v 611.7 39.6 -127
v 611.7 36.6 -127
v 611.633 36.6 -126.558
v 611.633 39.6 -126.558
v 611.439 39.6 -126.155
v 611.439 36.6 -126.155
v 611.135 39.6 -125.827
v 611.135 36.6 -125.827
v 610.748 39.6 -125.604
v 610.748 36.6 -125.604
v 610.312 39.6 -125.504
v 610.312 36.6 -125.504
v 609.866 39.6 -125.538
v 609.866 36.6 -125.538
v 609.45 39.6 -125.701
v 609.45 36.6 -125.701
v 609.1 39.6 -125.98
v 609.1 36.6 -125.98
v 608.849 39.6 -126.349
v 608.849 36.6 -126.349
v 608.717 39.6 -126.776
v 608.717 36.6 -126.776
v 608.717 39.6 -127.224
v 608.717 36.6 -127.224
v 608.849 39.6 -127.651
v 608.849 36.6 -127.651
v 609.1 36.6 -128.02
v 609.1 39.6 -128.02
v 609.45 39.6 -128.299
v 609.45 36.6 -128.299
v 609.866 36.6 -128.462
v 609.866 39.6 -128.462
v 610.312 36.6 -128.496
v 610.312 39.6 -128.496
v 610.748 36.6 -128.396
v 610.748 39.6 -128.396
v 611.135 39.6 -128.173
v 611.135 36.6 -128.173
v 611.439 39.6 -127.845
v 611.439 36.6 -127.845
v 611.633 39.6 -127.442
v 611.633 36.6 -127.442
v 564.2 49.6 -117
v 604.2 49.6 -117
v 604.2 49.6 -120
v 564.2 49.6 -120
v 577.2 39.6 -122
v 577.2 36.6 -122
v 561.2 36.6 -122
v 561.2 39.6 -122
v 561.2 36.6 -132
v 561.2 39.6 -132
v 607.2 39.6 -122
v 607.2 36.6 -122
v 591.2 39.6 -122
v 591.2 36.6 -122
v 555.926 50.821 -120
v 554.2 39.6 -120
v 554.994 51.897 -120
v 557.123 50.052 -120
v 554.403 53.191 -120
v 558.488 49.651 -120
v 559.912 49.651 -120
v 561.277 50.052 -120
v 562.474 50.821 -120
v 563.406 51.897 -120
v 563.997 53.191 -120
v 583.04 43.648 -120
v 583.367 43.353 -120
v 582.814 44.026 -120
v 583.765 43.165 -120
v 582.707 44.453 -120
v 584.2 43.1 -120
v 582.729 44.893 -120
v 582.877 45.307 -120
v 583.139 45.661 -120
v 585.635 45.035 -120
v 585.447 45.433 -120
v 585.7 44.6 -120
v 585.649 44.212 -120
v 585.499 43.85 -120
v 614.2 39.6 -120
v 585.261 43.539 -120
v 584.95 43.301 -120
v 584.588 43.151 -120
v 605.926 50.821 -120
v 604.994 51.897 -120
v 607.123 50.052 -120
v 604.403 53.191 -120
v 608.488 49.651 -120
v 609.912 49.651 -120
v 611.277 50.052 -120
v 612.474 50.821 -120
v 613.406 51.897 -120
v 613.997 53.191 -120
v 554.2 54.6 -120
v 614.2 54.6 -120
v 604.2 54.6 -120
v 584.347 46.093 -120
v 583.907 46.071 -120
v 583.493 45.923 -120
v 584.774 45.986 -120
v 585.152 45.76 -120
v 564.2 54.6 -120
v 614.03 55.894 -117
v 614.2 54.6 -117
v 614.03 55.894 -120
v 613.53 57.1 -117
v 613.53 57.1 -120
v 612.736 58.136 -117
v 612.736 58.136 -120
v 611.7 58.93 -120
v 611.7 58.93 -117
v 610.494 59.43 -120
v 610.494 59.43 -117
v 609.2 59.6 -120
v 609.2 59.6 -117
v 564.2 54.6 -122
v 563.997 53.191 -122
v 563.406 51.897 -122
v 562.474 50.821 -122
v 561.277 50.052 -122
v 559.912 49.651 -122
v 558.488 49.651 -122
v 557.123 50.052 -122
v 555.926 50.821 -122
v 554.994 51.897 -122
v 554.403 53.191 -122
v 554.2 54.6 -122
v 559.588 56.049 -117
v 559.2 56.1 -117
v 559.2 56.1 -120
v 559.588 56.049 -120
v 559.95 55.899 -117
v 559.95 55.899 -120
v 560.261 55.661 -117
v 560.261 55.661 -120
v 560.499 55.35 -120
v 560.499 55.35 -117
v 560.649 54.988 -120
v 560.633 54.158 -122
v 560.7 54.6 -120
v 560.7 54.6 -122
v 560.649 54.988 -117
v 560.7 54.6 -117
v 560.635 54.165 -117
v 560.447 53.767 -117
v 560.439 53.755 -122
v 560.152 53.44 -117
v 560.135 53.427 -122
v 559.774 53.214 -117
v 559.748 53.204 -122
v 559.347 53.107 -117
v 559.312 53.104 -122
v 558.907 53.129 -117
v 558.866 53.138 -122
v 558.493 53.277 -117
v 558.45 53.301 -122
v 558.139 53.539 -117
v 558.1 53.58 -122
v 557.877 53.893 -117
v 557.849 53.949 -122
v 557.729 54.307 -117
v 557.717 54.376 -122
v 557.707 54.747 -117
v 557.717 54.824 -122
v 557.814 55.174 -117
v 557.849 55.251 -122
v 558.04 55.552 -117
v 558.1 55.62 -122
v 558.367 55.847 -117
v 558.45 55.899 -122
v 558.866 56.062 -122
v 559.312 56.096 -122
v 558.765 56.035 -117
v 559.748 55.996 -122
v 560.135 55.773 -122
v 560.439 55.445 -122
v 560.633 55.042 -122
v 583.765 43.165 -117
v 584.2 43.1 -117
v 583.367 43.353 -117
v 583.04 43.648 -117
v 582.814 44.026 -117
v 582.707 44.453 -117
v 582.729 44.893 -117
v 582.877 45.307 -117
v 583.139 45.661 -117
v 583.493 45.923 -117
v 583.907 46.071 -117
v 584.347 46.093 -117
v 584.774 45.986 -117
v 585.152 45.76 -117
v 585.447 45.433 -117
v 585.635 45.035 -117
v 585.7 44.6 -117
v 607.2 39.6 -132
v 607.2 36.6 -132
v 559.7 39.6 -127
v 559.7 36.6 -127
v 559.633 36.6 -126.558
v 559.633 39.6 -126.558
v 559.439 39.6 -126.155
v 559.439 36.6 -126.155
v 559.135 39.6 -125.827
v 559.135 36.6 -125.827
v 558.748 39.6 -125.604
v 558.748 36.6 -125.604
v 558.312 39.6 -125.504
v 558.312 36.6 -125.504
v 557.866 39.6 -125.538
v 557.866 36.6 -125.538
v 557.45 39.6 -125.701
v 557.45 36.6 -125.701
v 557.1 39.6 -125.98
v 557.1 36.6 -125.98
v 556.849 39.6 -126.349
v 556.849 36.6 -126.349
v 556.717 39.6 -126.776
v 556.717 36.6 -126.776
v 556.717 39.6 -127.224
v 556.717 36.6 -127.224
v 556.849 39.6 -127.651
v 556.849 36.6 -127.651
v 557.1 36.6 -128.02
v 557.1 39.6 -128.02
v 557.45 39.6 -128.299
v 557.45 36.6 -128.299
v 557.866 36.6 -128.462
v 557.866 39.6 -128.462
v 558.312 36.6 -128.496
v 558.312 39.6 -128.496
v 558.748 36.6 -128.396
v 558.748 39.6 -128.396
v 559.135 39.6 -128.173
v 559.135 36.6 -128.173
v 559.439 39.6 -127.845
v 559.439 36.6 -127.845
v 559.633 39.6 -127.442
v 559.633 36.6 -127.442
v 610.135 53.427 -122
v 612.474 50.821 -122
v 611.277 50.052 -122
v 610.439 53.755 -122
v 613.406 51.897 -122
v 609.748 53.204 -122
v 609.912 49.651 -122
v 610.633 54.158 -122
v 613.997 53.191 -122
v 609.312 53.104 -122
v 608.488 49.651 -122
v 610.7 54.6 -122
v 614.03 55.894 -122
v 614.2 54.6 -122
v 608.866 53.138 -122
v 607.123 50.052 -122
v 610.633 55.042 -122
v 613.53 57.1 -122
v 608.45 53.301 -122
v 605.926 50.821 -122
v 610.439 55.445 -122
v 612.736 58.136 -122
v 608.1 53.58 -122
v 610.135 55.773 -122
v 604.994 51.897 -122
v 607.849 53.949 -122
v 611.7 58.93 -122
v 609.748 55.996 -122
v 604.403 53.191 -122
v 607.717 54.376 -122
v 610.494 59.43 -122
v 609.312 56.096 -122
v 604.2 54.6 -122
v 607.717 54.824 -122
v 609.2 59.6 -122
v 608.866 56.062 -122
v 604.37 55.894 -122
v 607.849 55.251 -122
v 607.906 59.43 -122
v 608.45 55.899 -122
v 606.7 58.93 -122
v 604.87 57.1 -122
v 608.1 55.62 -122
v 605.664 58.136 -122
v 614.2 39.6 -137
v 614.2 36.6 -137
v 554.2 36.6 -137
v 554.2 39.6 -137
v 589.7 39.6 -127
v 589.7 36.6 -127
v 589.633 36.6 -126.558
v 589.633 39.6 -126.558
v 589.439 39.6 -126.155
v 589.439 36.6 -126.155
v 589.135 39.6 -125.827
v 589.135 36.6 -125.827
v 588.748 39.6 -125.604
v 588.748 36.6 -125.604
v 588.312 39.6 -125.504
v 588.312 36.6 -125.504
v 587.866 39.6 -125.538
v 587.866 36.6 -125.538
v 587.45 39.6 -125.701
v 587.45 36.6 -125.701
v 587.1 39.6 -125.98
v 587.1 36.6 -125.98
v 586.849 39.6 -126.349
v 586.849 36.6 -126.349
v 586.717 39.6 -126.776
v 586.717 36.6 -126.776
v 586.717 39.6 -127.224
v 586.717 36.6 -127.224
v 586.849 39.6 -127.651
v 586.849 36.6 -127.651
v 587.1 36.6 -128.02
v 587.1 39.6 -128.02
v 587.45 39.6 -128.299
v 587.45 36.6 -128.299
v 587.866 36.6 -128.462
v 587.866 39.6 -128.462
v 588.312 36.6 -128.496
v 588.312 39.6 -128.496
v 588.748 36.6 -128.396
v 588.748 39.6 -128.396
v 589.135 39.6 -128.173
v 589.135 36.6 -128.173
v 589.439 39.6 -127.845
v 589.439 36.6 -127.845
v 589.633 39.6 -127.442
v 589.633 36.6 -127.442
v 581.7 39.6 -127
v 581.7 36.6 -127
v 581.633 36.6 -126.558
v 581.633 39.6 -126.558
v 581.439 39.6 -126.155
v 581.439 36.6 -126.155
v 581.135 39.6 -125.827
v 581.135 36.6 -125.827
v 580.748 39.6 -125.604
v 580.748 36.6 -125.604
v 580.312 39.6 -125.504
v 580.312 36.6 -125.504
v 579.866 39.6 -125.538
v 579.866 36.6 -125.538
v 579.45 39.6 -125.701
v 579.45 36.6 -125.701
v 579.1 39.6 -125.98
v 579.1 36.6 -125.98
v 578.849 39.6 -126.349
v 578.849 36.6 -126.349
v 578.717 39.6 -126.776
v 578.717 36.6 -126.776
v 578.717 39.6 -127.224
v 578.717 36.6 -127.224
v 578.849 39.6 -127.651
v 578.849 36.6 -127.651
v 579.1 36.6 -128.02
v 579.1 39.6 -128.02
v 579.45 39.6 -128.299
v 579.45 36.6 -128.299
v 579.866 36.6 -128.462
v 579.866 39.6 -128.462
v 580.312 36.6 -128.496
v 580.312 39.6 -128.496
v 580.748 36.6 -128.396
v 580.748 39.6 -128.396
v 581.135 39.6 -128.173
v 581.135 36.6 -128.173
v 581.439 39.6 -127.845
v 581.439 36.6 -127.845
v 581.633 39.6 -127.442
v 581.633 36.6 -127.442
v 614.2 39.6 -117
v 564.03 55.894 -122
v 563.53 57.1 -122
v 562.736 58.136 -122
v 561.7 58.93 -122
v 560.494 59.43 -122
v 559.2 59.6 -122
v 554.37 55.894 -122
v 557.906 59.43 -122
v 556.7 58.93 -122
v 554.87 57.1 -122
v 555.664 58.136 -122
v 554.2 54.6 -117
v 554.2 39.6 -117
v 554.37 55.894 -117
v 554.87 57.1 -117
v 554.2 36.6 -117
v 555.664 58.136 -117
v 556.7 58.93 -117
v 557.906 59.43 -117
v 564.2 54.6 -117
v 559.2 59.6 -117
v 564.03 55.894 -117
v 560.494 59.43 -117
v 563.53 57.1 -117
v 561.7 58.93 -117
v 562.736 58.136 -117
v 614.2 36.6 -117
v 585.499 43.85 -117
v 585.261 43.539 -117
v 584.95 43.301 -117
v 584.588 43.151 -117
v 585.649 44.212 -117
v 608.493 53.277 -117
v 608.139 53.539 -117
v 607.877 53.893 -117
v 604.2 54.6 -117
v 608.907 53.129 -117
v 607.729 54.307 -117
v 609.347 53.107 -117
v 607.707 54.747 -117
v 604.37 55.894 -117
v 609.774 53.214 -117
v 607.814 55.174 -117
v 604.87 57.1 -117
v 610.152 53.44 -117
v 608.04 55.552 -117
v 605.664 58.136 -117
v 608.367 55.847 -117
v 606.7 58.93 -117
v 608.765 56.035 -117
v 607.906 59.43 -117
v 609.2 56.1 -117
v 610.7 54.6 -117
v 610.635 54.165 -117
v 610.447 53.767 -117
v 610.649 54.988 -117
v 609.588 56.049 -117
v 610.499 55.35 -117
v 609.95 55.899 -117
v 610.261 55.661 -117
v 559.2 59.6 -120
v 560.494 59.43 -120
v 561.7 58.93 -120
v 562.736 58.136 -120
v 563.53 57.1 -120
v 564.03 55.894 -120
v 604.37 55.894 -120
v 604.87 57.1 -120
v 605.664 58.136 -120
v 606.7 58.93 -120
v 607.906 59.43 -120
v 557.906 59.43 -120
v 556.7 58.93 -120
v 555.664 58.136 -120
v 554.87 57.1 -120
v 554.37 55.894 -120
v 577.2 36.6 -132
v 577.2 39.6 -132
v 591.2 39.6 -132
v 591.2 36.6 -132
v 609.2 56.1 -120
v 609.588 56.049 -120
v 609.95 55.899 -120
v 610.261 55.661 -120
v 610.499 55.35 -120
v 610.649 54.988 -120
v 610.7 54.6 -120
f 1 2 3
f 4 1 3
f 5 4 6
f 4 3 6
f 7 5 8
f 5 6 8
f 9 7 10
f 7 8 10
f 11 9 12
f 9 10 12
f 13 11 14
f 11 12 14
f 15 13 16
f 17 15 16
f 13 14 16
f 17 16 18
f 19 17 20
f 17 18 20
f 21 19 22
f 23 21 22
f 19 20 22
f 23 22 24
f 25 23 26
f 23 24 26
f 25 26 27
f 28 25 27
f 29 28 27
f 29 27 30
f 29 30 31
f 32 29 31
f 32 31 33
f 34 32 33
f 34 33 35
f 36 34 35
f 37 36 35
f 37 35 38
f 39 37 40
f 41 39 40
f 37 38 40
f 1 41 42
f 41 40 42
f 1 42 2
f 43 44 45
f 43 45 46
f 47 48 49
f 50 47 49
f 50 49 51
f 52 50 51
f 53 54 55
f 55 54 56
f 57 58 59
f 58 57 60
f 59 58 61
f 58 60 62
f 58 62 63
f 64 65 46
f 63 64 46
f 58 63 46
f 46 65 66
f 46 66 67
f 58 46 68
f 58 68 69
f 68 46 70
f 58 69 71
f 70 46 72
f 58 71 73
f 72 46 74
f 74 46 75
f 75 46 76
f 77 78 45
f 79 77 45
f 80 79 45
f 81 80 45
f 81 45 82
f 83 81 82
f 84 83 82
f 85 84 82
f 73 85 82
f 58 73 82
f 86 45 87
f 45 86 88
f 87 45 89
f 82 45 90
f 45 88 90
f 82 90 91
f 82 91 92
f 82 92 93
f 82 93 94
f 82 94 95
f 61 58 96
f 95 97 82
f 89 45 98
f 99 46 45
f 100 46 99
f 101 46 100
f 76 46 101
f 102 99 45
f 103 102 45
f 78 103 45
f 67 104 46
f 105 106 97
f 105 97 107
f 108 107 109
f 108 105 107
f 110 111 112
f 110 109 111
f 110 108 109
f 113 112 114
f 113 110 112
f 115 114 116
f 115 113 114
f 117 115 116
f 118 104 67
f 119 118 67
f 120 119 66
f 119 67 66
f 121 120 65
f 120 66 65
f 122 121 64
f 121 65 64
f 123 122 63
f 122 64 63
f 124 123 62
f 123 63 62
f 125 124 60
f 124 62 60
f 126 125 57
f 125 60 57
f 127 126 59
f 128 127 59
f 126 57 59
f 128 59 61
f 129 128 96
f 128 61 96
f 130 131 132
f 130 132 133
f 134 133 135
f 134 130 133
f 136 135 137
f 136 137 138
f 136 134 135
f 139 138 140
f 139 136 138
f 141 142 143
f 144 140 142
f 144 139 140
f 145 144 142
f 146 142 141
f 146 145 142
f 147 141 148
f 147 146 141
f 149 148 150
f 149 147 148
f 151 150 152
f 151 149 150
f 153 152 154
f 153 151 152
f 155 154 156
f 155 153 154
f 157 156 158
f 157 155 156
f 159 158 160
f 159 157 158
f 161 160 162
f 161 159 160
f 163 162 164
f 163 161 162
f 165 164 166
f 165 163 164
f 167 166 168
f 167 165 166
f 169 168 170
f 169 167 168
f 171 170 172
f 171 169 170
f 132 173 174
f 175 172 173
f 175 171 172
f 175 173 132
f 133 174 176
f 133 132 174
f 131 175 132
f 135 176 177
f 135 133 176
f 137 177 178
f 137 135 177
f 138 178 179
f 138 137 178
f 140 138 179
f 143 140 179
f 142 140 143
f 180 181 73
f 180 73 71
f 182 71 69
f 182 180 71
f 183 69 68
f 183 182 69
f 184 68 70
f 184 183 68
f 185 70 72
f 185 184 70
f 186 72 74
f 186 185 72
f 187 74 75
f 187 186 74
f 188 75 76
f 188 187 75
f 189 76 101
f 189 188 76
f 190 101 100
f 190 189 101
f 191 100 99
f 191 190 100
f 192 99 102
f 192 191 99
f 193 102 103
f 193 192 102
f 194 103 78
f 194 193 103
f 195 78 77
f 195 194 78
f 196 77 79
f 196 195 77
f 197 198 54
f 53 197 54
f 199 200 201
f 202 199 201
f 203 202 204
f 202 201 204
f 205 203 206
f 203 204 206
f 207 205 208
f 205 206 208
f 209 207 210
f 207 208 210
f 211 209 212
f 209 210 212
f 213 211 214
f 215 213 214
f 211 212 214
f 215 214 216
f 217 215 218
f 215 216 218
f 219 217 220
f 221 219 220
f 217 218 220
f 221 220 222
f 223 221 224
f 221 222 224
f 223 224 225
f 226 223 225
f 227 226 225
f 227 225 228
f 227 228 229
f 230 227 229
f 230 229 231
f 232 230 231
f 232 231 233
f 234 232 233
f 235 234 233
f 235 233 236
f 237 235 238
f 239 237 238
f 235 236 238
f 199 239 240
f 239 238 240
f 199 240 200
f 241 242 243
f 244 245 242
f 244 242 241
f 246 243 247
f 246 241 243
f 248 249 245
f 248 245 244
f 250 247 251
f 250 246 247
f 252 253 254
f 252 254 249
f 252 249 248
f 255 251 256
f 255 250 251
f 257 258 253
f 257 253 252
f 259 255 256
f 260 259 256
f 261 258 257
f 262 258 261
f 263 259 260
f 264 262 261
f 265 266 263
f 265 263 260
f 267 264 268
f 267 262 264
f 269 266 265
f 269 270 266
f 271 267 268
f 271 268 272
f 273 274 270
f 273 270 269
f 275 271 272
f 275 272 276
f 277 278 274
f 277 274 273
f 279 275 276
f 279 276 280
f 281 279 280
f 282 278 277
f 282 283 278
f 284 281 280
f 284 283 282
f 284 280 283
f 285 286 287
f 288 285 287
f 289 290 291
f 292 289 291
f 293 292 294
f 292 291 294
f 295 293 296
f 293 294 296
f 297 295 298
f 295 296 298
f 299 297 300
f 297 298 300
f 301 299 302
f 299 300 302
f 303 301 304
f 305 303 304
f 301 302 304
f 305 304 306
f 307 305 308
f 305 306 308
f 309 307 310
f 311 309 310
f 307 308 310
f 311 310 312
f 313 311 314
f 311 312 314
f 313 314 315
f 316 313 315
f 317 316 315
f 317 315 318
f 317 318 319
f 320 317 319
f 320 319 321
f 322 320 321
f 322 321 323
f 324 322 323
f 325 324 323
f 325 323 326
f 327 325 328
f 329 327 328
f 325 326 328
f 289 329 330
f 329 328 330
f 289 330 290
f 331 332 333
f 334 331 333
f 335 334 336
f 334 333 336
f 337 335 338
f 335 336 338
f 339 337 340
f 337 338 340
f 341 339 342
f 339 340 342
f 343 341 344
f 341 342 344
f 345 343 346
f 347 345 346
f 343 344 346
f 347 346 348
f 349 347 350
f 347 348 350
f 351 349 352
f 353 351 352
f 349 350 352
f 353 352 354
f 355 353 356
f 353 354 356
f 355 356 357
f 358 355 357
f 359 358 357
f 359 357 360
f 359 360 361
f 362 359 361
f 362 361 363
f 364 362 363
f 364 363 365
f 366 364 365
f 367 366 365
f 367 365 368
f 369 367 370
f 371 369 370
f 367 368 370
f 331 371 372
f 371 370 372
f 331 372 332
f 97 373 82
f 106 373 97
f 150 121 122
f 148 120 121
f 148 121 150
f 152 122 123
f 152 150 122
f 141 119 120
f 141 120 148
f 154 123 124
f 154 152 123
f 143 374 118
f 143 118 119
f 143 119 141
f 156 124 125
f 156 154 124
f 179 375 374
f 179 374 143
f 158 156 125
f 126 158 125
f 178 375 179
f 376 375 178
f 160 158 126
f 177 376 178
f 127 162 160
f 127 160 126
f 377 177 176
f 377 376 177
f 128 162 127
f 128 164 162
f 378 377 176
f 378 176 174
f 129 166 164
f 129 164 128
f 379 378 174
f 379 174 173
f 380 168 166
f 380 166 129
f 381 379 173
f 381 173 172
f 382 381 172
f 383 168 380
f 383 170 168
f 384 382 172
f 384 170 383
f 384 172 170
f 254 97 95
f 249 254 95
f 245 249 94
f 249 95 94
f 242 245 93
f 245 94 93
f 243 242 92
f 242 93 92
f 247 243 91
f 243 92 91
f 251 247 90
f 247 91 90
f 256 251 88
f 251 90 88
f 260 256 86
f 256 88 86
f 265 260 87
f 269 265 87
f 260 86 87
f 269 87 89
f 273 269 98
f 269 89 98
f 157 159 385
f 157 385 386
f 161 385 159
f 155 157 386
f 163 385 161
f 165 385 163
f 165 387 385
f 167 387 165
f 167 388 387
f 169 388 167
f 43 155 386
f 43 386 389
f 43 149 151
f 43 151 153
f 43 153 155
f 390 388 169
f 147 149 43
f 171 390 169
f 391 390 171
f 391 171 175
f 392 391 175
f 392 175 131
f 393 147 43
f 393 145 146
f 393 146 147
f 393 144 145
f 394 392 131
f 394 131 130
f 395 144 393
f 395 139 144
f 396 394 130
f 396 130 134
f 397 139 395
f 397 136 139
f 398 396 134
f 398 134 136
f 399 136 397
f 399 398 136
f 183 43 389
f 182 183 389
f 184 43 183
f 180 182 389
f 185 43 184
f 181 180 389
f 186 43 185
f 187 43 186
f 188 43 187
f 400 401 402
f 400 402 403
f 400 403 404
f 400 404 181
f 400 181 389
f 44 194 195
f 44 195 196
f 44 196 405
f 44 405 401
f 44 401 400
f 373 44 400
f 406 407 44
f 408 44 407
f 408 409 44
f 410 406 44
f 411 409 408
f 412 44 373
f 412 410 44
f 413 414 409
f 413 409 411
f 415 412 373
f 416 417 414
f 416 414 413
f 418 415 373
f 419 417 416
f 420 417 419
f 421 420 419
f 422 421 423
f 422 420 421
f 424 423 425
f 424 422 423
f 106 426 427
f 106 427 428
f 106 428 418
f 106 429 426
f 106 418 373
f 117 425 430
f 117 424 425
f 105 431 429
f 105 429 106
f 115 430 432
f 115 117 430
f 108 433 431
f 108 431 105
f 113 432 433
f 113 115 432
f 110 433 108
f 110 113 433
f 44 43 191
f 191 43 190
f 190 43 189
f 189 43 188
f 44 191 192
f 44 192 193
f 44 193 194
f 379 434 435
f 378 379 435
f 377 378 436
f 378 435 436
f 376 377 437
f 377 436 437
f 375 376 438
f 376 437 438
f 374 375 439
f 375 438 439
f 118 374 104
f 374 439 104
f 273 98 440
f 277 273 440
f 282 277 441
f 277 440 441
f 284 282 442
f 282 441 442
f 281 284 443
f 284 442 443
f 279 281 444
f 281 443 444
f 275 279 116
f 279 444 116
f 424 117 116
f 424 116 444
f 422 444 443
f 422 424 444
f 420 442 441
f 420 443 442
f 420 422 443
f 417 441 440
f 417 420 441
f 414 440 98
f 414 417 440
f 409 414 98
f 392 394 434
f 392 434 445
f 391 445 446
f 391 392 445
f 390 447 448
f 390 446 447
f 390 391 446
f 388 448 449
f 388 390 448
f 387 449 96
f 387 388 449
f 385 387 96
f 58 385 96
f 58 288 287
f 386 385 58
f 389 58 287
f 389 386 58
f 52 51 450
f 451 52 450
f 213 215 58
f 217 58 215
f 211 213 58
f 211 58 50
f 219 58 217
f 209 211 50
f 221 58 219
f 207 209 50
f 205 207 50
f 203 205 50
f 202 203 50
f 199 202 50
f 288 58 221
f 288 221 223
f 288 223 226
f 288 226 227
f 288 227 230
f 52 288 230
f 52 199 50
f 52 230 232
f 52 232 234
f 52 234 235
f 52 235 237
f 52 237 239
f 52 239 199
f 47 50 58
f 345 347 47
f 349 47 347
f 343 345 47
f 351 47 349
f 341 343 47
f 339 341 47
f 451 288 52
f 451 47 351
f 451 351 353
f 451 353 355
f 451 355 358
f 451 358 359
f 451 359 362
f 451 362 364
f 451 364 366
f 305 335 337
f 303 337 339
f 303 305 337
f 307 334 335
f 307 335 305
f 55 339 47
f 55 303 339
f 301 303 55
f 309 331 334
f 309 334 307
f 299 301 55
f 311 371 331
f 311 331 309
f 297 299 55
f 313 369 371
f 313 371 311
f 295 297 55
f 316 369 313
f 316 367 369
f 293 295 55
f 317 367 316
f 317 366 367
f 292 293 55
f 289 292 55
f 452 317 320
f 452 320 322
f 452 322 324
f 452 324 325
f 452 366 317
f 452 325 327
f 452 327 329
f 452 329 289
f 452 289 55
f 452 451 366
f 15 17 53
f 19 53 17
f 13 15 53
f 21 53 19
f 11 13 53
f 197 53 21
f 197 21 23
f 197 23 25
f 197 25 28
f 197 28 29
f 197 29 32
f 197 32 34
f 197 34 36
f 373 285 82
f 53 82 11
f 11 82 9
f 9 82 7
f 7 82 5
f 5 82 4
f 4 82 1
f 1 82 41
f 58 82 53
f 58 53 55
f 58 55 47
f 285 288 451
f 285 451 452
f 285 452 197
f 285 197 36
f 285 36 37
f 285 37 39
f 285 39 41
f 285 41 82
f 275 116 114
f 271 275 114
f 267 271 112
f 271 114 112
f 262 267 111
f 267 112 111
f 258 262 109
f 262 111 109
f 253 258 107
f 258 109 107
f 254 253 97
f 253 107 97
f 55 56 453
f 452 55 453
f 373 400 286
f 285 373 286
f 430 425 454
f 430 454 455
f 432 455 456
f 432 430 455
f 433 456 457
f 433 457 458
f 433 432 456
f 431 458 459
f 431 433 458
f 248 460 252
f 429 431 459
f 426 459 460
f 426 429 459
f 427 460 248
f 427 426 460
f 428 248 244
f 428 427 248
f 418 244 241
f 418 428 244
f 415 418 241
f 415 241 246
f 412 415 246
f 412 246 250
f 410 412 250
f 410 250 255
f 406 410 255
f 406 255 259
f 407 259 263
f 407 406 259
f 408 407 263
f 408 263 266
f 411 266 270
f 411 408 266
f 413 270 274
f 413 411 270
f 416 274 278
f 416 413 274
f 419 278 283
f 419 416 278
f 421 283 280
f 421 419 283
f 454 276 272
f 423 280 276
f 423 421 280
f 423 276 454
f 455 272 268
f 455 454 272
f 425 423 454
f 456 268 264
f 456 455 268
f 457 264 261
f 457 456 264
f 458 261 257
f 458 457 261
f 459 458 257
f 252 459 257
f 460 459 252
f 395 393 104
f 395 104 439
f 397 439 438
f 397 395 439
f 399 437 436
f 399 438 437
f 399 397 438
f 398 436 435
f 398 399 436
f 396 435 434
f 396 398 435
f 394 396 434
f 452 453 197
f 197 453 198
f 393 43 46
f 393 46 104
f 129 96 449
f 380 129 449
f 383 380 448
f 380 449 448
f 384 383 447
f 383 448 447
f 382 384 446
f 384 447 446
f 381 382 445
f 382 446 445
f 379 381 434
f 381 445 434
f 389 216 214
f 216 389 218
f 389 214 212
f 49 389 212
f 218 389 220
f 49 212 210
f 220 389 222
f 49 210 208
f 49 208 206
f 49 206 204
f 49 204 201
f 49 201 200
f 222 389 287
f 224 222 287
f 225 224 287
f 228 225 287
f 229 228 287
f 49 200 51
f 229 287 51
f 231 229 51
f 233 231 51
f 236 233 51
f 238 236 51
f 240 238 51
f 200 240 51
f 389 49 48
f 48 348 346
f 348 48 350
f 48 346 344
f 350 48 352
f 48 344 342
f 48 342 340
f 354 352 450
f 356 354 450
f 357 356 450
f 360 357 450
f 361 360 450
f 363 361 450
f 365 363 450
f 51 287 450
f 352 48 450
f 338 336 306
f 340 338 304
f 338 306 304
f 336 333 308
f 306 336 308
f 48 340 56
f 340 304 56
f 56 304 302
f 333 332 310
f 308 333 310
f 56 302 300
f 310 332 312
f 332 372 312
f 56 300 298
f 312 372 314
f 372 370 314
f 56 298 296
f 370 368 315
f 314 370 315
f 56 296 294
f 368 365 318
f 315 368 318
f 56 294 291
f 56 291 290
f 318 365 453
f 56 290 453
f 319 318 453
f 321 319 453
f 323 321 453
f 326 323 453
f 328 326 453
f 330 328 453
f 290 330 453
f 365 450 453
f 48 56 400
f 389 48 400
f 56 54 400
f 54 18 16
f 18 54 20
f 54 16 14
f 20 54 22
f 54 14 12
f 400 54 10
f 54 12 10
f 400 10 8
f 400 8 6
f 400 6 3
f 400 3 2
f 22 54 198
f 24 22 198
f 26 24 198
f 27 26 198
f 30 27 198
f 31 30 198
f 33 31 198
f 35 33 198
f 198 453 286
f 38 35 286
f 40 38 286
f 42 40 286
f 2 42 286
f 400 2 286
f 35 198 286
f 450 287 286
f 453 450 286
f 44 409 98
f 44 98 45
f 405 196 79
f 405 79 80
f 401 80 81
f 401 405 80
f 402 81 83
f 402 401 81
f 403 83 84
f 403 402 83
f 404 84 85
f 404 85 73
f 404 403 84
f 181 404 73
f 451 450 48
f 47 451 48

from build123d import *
from build123d.topology import SkipClean

# Parameters (mm, degrees)
SKETCH1_W           = 1524
SKETCH1_H           = 508
SKETCH1_W_2         = 406.4
SKETCH1_H_2         = 254
SKETCH1_R           = 38.1
BOSS_EXTRUDE2_DEPTH = 76.2
SCALE2_SCALE        = 0.039370079
SKETCH3_R           = 1.5
BOSS_EXTRUDE3_DEPTH = 3
SKETCH4_R           = 5
SKETCH4_R_2         = 1.5
BOSS_EXTRUDE5_DEPTH = 2
CUT_EXTRUDE1_START  = -29
CUT_EXTRUDE1_DEPTH  = 29


with BuildPart() as part:
    # Sketch1 → Boss-Extrude2 (new body)
    with BuildSketch(Plane(origin=(0, 0, 0), x_dir=(1, 0, 0), z_dir=(0, 1, 0))):
        with Locations((584.2, 127)):
            Rectangle(SKETCH1_W, SKETCH1_H)
        with Locations((203.2, 127)):
            Rectangle(SKETCH1_W_2, SKETCH1_H_2, mode=Mode.SUBTRACT)
        with Locations((482.6, 127)):
            Circle(SKETCH1_R, mode=Mode.SUBTRACT)
        with Locations((685.8, 127)):
            Circle(SKETCH1_R, mode=Mode.SUBTRACT)
        with Locations((965.2, 127)):
            Rectangle(SKETCH1_W_2, SKETCH1_H_2, mode=Mode.SUBTRACT)
        with Locations((1244.6, 127)):
            Circle(SKETCH1_R, mode=Mode.SUBTRACT)
        with Locations((-76.2, 127)):
            Circle(SKETCH1_R, mode=Mode.SUBTRACT)
    extrude(amount=BOSS_EXTRUDE2_DEPTH)


with BuildPart() as part_1:
    # Scale2: scaled about (584.2, 38.1, -127)
    add(part.part.scale(SCALE2_SCALE).moved(Location((561.2, 36.6, -122))))

    # Sketch3 → Boss-Extrude3 (add)
    with BuildSketch(Plane.XY.offset(-117)):
        Polygon((604.2, 49.6), (564.2, 49.6), (564.2, 59.6), (559.2, 59.6), (554.2, 59.6), (554.2, 39.6), (584.2, 39.6), (614.2, 39.6), (614.2, 59.6), (609.2, 59.6), (604.2, 59.6), align=None)
        with Locations((584.2, 44.6)):
            Circle(SKETCH3_R, mode=Mode.SUBTRACT)
        with Locations((559.2, 54.6)):
            Circle(SKETCH3_R, mode=Mode.SUBTRACT)
        with Locations((609.2, 54.6)):
            Circle(SKETCH3_R, mode=Mode.SUBTRACT)
    extrude(amount=-BOSS_EXTRUDE3_DEPTH)

    # Sketch4 → Boss-Extrude5 (add)
    # profile 1 of 2: a face of its own
    with SkipClean():  # the faces are left unmerged after this step: merging them gives an invalid solid
        with BuildSketch(Plane(origin=(0, 0, -120), x_dir=(-1, 0, 0), z_dir=(0, 0, -1))):
            with Locations((-559.2, 54.6)):
                Circle(SKETCH4_R)
            with Locations((-559.2, 54.6)):
                Circle(SKETCH4_R_2, mode=Mode.SUBTRACT)
        # profile 2 of 2: a face of its own
        with BuildSketch(Plane(origin=(0, 0, -120), x_dir=(-1, 0, 0), z_dir=(0, 0, -1))):
            with Locations((-609.2, 54.6)):
                Circle(SKETCH4_R)
            with Locations((-609.2, 54.6)):
                Circle(SKETCH4_R_2, mode=Mode.SUBTRACT)
        extrude(amount=BOSS_EXTRUDE5_DEPTH)
    add(part_1.part.scale(1), mode=Mode.REPLACE)  # the faces are merged on a copy

    # Sketch5 → Cut-Extrude1 (cut)
    with BuildSketch(Plane(origin=(0, 0, -122), x_dir=(-1, 0, 0), z_dir=(0, 0, -1)).offset(CUT_EXTRUDE1_START)):
        with BuildLine():
            ThreePointArc((-614.2, 54.6), (-612.735533906, 58.135533906), (-609.2, 59.6))
            Line((-609.2, 59.6), (-614.2, 59.6))
            Line((-614.2, 59.6), (-614.2, 54.6))
        make_face()
        with BuildLine():
            Line((-604.2, 59.6), (-609.2, 59.6))
            ThreePointArc((-609.2, 59.6), (-605.664466094, 58.135533906), (-604.2, 54.6))
            Line((-604.2, 54.6), (-604.2, 59.6))
        make_face()
        with BuildLine():
            ThreePointArc((-564.2, 54.6), (-562.735533906, 58.135533906), (-559.2, 59.6))
            Line((-559.2, 59.6), (-564.2, 59.6))
            Line((-564.2, 59.6), (-564.2, 54.6))
        make_face()
        with BuildLine():
            Line((-554.2, 59.6), (-559.2, 59.6))
            ThreePointArc((-559.2, 59.6), (-555.664466094, 58.135533906), (-554.2, 54.6))
            Line((-554.2, 54.6), (-554.2, 59.6))
        make_face()
    extrude(amount=CUT_EXTRUDE1_DEPTH, mode=Mode.SUBTRACT)


solid = part_1.part
